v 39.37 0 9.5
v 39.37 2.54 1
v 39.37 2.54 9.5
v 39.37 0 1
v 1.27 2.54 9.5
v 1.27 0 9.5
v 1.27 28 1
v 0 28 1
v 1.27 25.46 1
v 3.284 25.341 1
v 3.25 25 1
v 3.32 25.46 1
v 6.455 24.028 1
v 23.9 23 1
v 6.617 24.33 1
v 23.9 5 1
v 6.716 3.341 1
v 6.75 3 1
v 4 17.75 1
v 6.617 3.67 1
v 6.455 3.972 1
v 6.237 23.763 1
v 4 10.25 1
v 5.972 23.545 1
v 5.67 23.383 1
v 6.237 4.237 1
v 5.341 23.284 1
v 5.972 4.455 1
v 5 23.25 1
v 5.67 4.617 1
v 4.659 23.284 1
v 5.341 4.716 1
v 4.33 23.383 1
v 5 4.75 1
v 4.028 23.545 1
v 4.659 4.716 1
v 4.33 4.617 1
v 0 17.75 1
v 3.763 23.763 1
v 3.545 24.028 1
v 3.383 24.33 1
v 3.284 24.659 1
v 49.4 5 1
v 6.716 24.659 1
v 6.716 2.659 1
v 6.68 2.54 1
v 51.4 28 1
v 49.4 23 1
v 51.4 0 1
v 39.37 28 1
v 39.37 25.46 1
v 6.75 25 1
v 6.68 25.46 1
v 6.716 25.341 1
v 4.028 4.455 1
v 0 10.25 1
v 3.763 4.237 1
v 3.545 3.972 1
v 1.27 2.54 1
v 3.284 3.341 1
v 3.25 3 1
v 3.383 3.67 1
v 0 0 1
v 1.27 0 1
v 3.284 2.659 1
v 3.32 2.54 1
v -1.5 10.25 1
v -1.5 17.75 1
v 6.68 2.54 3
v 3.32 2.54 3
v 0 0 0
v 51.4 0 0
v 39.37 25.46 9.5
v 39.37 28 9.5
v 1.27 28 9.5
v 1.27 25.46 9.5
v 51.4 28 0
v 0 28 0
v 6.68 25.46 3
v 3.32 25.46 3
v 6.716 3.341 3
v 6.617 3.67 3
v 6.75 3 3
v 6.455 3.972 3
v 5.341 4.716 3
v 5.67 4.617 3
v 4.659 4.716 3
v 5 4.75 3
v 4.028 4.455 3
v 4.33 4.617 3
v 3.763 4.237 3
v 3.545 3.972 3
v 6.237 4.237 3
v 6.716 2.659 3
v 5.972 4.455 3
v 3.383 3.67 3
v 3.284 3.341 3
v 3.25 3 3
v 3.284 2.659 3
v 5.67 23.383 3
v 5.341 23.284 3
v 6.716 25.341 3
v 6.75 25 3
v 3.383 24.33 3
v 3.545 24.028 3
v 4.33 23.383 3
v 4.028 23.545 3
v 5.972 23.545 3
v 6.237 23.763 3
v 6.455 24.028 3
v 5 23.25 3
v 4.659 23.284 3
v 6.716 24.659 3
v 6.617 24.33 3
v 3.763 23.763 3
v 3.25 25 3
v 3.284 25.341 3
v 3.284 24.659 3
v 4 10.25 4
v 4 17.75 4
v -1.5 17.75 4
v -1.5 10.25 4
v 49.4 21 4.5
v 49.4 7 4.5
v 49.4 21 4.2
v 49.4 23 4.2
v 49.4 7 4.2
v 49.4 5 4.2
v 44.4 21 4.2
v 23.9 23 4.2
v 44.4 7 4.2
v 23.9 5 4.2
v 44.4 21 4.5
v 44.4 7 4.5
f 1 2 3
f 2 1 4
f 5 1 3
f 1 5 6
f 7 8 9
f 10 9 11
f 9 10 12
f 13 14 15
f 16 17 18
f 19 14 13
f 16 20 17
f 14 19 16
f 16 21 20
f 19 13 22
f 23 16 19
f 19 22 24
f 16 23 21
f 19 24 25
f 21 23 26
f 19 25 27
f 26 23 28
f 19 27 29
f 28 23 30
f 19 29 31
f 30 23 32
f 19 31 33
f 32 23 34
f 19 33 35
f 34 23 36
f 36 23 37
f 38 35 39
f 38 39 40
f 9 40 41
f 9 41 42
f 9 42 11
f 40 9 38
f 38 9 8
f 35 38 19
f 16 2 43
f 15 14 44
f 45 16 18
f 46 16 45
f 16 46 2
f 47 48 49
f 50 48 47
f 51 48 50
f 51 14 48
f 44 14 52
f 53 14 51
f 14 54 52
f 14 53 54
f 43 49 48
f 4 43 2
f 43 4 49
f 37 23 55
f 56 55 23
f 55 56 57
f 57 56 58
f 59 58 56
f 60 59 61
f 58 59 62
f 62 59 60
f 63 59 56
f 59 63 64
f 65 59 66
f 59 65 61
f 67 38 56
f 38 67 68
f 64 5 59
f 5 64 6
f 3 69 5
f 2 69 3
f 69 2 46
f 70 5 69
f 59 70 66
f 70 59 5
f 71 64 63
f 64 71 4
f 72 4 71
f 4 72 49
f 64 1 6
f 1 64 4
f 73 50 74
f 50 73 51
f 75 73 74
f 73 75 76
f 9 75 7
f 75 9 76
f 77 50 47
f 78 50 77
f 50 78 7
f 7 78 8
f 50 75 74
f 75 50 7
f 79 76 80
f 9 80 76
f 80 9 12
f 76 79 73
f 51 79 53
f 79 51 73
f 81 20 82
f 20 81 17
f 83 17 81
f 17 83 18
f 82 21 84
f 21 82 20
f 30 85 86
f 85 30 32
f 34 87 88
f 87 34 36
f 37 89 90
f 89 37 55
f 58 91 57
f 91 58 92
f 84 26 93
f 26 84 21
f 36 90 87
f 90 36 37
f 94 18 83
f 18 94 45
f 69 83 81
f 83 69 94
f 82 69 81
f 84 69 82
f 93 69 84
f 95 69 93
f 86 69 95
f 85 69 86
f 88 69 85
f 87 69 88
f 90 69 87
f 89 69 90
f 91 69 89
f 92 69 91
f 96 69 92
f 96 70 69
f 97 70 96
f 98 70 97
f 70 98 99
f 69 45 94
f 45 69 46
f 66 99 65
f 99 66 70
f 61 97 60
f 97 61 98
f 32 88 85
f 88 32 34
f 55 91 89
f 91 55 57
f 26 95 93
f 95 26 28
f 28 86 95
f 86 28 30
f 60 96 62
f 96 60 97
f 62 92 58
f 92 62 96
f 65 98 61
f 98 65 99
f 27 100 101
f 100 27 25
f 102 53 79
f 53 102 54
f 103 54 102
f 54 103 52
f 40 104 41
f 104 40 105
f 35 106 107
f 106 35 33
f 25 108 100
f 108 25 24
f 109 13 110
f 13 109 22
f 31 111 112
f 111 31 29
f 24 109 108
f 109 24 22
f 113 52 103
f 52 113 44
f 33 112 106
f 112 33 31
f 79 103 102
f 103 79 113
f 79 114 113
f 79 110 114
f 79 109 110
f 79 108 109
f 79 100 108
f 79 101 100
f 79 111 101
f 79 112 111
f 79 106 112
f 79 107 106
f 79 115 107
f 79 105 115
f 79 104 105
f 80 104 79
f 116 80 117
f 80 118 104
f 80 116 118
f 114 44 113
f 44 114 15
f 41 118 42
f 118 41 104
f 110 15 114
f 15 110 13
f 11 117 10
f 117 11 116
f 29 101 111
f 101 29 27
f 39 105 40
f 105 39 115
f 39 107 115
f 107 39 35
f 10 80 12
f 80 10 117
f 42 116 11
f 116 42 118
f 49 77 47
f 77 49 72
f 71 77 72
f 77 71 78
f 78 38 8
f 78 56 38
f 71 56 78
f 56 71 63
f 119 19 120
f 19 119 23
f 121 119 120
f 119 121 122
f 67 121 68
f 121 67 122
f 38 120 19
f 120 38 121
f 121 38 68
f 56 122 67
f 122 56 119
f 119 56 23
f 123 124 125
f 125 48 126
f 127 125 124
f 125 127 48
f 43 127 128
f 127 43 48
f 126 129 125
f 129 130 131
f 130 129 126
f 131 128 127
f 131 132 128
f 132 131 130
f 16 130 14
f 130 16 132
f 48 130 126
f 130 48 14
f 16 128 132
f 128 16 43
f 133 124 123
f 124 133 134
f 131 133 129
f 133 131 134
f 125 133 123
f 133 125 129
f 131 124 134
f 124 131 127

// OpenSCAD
$fn = 32;
pcb_w = 51.4; pcb_h = 28.0; pcb_t = 1.0;

// PCB
color("green") cube([pcb_w, pcb_h, pcb_t]);

// Pin headers: 2x 15-pin along long edges
color([0.2,0.2,0.2]) {
    translate([1.27, 0, pcb_t]) cube([15*2.54, 2.54, 8.5]);
    translate([1.27, pcb_h-2.54, pcb_t]) cube([15*2.54, 2.54, 8.5]);
}

// Micro-USB connector
color("silver") translate([-1.5, (pcb_h-7.5)/2, pcb_t]) cube([5.5, 7.5, 3]);

// ESP32-WROOM module (shielded can)
color("silver") translate([pcb_w-25.5-2.0, (pcb_h-18)/2, pcb_t]) cube([25.5, 18, 3.2]);

// Antenna area (ceramic patch at end of module)
color([0.9,0.85,0.7]) translate([pcb_w-7.0, (pcb_h-14)/2, pcb_t+3.2]) cube([5.0, 14, 0.3]);

// EN + BOOT buttons
color([0.3,0.3,0.3]) {
    translate([5.0, 3.0, pcb_t]) cylinder(d=3.5, h=2.0);
    translate([5.0, pcb_h-3.0, pcb_t]) cylinder(d=3.5, h=2.0);
}
